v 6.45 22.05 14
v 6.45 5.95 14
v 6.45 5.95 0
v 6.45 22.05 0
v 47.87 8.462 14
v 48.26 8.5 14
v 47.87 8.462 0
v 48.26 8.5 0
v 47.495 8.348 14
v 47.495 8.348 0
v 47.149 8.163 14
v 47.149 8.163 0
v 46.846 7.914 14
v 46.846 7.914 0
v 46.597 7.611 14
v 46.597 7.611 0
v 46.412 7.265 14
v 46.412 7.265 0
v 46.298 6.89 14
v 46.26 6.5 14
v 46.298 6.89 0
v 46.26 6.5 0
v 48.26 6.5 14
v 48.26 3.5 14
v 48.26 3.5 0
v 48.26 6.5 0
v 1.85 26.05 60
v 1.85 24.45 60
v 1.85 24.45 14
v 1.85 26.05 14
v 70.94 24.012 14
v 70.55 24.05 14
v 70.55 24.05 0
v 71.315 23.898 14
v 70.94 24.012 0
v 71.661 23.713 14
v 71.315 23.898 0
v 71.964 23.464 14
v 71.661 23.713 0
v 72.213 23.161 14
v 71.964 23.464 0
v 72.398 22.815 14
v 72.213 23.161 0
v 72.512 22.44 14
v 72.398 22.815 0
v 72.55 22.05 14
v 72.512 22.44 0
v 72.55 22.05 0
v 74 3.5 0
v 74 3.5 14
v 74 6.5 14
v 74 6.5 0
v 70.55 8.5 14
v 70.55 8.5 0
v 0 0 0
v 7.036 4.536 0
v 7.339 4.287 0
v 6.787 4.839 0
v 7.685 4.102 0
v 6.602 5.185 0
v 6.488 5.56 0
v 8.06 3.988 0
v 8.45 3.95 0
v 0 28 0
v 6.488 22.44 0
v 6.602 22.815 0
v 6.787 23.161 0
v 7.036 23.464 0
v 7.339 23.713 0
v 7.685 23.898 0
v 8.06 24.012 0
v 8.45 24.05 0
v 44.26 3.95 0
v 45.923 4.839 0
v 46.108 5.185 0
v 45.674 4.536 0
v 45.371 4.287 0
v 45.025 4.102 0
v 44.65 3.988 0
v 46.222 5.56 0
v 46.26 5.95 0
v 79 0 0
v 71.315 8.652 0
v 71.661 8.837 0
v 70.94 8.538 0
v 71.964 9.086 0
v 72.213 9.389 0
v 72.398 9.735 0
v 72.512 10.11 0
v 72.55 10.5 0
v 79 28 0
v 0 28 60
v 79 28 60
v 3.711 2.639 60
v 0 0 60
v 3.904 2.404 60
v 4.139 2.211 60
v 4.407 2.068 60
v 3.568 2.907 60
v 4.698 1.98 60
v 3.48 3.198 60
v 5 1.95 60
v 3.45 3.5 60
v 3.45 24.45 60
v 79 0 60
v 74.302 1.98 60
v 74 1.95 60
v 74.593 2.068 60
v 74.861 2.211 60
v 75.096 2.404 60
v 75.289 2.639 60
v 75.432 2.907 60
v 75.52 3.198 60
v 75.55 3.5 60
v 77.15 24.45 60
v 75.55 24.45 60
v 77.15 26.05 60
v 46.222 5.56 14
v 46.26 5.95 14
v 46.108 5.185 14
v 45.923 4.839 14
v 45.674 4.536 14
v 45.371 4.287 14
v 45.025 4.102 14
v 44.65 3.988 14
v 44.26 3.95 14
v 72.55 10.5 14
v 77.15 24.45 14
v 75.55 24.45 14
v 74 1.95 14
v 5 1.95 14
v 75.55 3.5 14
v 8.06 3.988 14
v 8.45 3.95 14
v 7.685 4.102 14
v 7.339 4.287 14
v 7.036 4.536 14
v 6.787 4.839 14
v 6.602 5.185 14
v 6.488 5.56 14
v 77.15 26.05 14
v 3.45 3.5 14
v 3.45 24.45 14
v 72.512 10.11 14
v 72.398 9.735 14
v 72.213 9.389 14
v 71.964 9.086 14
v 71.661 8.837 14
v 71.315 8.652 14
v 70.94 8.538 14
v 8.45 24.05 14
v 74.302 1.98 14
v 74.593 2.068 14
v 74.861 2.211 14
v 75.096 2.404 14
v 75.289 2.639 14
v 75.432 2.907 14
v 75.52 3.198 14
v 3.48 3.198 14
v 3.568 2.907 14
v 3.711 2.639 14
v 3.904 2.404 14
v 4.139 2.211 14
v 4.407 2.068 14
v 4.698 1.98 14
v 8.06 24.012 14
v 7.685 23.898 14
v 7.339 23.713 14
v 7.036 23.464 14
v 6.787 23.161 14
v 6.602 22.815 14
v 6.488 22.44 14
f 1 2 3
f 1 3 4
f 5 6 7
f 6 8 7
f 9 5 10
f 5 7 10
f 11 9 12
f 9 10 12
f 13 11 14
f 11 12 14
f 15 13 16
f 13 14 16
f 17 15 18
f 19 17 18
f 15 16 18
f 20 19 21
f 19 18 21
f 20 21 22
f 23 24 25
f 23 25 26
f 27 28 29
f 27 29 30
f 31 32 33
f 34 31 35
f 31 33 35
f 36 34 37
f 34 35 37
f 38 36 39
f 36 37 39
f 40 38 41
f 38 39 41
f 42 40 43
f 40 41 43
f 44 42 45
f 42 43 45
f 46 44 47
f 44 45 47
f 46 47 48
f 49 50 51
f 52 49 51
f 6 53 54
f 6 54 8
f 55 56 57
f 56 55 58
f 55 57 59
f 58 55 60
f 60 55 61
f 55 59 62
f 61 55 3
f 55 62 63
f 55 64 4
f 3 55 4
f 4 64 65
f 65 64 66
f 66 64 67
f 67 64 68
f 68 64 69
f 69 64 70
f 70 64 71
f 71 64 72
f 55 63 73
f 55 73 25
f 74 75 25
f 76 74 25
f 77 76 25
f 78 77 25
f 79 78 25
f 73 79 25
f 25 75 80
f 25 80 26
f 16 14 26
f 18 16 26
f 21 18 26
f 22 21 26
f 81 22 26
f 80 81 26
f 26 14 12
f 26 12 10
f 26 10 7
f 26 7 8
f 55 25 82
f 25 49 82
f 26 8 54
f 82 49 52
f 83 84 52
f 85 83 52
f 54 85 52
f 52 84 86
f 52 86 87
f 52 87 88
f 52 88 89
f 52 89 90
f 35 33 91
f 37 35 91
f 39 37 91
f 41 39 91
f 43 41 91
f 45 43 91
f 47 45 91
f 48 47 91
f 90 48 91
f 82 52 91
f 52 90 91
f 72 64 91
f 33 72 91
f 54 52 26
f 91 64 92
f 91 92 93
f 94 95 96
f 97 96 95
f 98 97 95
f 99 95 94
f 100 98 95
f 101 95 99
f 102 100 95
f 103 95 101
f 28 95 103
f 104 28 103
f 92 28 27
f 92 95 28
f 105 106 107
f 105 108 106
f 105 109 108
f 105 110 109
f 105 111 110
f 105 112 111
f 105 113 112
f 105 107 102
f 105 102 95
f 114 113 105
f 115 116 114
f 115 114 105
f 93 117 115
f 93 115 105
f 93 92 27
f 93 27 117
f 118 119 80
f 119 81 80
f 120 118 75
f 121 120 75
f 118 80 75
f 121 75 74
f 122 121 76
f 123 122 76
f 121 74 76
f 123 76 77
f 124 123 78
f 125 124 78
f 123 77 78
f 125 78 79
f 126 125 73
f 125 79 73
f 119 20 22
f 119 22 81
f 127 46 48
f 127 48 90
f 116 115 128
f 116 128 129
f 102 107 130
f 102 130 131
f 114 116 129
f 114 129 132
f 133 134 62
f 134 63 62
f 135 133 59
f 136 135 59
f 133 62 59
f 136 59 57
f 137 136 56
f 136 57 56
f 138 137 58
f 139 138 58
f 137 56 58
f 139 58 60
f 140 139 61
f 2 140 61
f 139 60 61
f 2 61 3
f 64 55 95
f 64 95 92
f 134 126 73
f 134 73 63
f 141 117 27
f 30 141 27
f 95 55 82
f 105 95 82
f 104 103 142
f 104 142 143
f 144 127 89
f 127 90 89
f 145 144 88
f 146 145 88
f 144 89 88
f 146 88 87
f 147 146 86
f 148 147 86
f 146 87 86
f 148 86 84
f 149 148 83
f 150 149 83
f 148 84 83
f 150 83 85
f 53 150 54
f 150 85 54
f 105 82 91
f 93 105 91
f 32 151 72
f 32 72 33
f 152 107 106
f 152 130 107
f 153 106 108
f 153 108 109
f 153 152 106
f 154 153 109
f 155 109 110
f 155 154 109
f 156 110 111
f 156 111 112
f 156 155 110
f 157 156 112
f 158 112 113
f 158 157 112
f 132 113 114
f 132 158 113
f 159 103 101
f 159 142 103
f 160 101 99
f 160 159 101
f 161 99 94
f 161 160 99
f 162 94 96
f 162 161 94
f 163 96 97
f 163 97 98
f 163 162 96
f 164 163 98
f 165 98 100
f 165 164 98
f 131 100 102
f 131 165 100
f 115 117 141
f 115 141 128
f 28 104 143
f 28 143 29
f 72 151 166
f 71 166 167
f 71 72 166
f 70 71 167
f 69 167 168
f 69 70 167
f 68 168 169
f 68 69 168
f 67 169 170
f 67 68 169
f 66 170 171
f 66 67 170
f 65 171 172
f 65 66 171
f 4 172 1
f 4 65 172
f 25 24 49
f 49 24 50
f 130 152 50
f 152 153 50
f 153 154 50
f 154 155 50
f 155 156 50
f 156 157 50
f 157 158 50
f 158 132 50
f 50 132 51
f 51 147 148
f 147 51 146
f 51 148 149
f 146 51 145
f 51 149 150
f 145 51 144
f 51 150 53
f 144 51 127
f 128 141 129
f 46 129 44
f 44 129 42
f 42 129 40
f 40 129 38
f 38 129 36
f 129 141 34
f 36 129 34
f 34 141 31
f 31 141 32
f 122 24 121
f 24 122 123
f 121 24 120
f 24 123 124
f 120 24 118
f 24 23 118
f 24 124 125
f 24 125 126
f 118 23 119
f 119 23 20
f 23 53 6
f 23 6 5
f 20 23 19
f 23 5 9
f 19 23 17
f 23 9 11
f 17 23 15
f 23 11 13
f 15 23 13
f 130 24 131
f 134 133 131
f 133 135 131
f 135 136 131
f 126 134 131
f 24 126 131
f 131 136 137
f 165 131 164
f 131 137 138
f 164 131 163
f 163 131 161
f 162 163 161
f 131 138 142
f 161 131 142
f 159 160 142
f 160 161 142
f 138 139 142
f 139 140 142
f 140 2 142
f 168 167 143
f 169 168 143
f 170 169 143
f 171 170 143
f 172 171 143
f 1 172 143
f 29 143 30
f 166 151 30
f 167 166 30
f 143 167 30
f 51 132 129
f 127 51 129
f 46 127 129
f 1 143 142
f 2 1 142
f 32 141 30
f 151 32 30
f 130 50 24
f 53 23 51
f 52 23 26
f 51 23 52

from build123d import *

# Parameters (mm, degrees)
SKETCH1_W           = 79
SKETCH1_H           = 28
BOSS_EXTRUDE1_DEPTH = 60
CUT_EXTRUDE1_DEPTH  = 46
SKETCH3_W           = 25.74
SKETCH3_H           = 3
CUT_EXTRUDE2_DEPTH  = 26
CUT_EXTRUDE3_DEPTH  = 26
FILLET1_R           = 1.55
FILLET2_R           = 2


with BuildPart() as part:
    # Sketch1 → Boss-Extrude1 (new body)
    with BuildSketch(Plane.XY):
        with Locations((39.5, 14)):
            Rectangle(SKETCH1_W, SKETCH1_H)
    extrude(amount=BOSS_EXTRUDE1_DEPTH)

    # Sketch2 → Cut-Extrude1 (cut)
    with BuildSketch(Plane.XY.offset(60)):
        Polygon((3.45, 26.05), (75.6, 26.05), (77.15, 26.05), (77.15, 24.45), (75.55, 24.45), (75.55, 1.95), (3.45, 1.95), (3.45, 24.45), (1.85, 24.45), (1.85, 26.05), align=None)
    extrude(amount=-CUT_EXTRUDE1_DEPTH, mode=Mode.SUBTRACT)

    # Sketch3 → Cut-Extrude2 (cut)
    with BuildSketch(Plane.XY.offset(14)):
        with Locations((61.13, 5)):
            Rectangle(SKETCH3_W, SKETCH3_H)
    extrude(amount=-CUT_EXTRUDE2_DEPTH, mode=Mode.SUBTRACT)

    # Sketch4 → Cut-Extrude3 (cut)
    with BuildSketch(Plane.XY.offset(14)):
        Polygon((6.45, 24.05), (72.55, 24.05), (72.55, 8.5), (46.26, 8.5), (46.26, 3.95), (6.45, 3.95), align=None)
    extrude(amount=-CUT_EXTRUDE3_DEPTH, mode=Mode.SUBTRACT)

    # Fillet1
    fillet1_edges = [part.edges().sort_by_distance(p)[0] for p in [
        (75.55, 1.95, 37),
        (3.45, 1.95, 37),
    ]]
    fillet(fillet1_edges, radius=FILLET1_R)

    # Fillet2
    fillet2_edges = [part.edges().sort_by_distance(p)[0] for p in [
        (6.45, 3.95, 7),
        (6.45, 24.05, 7),
        (72.55, 24.05, 7),
        (72.55, 8.5, 7),
        (46.26, 8.5, 7),
        (46.26, 3.95, 7),
    ]]
    fillet(fillet2_edges, radius=FILLET2_R)


solid = part.part
